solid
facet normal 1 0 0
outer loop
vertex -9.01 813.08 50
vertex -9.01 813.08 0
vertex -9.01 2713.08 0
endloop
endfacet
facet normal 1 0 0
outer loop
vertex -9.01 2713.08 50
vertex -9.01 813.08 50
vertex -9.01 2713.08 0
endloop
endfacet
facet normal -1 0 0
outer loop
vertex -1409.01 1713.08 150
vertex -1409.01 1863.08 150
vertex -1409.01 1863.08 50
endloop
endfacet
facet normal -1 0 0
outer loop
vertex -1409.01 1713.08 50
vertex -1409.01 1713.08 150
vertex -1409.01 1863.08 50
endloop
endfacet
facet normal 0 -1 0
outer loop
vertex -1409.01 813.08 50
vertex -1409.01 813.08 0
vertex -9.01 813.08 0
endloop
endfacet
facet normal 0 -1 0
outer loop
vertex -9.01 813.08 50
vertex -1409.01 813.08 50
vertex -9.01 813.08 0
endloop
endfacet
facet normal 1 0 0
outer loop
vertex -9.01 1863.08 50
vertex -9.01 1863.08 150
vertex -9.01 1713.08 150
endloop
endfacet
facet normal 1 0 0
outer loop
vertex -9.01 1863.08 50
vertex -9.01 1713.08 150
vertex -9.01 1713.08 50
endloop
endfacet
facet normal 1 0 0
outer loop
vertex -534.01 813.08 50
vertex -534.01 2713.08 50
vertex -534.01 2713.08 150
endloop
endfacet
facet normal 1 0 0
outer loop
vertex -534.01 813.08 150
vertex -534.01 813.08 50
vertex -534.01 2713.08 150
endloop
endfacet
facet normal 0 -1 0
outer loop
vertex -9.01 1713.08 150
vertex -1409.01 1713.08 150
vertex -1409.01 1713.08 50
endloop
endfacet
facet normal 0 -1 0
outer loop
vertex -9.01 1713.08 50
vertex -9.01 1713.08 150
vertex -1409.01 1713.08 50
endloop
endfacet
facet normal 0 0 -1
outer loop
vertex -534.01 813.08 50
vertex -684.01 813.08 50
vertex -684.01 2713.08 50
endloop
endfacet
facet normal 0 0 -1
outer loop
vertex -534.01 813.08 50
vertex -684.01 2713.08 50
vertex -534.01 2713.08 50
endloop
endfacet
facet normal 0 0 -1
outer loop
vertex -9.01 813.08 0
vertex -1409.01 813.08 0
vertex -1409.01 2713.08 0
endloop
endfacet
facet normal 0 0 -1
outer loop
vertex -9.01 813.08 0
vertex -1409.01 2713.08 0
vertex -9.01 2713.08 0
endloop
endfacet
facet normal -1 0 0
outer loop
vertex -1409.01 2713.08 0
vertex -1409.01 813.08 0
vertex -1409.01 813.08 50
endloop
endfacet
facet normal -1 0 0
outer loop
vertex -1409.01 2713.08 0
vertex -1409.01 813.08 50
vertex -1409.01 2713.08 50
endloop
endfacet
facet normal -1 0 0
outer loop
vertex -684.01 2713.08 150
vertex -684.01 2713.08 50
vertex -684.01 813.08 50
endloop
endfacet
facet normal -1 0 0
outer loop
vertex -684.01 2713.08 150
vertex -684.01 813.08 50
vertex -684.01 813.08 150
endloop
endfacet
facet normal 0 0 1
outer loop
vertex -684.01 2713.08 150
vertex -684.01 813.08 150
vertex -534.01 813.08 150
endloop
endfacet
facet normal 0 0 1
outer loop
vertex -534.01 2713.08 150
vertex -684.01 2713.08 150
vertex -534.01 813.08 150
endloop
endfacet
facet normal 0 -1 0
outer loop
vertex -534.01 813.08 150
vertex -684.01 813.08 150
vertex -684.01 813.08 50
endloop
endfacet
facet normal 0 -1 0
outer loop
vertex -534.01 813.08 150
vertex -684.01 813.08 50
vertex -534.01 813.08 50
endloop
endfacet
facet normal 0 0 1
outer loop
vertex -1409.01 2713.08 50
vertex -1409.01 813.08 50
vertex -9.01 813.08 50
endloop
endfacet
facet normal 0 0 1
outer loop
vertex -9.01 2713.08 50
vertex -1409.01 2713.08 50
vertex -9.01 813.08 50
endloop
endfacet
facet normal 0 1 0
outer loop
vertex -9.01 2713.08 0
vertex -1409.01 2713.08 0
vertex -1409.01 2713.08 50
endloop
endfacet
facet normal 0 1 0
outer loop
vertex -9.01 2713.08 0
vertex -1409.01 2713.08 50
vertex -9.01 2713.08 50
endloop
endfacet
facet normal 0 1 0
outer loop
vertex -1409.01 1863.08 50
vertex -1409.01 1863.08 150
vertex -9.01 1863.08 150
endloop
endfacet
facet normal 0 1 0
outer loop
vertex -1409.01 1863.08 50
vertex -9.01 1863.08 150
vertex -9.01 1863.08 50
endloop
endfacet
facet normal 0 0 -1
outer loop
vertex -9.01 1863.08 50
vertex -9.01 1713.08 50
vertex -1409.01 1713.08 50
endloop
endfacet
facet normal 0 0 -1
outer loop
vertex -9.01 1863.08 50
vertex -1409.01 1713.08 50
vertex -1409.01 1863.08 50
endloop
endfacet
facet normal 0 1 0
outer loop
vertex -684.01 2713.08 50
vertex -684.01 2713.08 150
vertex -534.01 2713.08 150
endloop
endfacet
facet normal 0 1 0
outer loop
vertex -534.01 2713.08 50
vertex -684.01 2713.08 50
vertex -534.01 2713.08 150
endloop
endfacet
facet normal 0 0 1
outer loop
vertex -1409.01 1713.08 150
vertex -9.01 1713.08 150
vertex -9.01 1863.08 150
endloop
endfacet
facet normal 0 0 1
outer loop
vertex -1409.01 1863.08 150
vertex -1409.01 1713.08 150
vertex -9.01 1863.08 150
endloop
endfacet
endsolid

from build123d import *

# Parameters (mm, degrees)
SKETCH1_W           = 1400
SKETCH1_H           = 1900
BOSS_EXTRUDE1_DEPTH = 50
SKETCH3_W           = 100
SKETCH3_H           = 150
BOSS_EXTRUDE3_DEPTH = 1400
SKETCH4_W           = 150
SKETCH4_H           = 100
BOSS_EXTRUDE4_DEPTH = 1900


with BuildPart() as part:
    # Sketch1 → Boss-Extrude1 (new body)
    with BuildSketch(Plane.XY):
        with Locations((-709.010111523, 1763.08)):
            Rectangle(SKETCH1_W, SKETCH1_H)
    extrude(amount=BOSS_EXTRUDE1_DEPTH)


with BuildPart() as body_2:
    # Sketch3 → Boss-Extrude3 (new body)
    with BuildSketch(Plane(origin=(-9.010111523, 0, 0), x_dir=(0, 0, -1), z_dir=(1, 0, 0))):
        with Locations((-100, 1788.08)):
            Rectangle(SKETCH3_W, SKETCH3_H)
    extrude(amount=-BOSS_EXTRUDE3_DEPTH)


with BuildPart() as body_3:
    # Sketch4 → Boss-Extrude4 (new body)
    with BuildSketch(Plane.XZ.offset(-813.08)):
        with Locations((-609.010111523, 100)):
            Rectangle(SKETCH4_W, SKETCH4_H)
    extrude(amount=-BOSS_EXTRUDE4_DEPTH)


solid = Compound([part.part, body_2.part, body_3.part])
